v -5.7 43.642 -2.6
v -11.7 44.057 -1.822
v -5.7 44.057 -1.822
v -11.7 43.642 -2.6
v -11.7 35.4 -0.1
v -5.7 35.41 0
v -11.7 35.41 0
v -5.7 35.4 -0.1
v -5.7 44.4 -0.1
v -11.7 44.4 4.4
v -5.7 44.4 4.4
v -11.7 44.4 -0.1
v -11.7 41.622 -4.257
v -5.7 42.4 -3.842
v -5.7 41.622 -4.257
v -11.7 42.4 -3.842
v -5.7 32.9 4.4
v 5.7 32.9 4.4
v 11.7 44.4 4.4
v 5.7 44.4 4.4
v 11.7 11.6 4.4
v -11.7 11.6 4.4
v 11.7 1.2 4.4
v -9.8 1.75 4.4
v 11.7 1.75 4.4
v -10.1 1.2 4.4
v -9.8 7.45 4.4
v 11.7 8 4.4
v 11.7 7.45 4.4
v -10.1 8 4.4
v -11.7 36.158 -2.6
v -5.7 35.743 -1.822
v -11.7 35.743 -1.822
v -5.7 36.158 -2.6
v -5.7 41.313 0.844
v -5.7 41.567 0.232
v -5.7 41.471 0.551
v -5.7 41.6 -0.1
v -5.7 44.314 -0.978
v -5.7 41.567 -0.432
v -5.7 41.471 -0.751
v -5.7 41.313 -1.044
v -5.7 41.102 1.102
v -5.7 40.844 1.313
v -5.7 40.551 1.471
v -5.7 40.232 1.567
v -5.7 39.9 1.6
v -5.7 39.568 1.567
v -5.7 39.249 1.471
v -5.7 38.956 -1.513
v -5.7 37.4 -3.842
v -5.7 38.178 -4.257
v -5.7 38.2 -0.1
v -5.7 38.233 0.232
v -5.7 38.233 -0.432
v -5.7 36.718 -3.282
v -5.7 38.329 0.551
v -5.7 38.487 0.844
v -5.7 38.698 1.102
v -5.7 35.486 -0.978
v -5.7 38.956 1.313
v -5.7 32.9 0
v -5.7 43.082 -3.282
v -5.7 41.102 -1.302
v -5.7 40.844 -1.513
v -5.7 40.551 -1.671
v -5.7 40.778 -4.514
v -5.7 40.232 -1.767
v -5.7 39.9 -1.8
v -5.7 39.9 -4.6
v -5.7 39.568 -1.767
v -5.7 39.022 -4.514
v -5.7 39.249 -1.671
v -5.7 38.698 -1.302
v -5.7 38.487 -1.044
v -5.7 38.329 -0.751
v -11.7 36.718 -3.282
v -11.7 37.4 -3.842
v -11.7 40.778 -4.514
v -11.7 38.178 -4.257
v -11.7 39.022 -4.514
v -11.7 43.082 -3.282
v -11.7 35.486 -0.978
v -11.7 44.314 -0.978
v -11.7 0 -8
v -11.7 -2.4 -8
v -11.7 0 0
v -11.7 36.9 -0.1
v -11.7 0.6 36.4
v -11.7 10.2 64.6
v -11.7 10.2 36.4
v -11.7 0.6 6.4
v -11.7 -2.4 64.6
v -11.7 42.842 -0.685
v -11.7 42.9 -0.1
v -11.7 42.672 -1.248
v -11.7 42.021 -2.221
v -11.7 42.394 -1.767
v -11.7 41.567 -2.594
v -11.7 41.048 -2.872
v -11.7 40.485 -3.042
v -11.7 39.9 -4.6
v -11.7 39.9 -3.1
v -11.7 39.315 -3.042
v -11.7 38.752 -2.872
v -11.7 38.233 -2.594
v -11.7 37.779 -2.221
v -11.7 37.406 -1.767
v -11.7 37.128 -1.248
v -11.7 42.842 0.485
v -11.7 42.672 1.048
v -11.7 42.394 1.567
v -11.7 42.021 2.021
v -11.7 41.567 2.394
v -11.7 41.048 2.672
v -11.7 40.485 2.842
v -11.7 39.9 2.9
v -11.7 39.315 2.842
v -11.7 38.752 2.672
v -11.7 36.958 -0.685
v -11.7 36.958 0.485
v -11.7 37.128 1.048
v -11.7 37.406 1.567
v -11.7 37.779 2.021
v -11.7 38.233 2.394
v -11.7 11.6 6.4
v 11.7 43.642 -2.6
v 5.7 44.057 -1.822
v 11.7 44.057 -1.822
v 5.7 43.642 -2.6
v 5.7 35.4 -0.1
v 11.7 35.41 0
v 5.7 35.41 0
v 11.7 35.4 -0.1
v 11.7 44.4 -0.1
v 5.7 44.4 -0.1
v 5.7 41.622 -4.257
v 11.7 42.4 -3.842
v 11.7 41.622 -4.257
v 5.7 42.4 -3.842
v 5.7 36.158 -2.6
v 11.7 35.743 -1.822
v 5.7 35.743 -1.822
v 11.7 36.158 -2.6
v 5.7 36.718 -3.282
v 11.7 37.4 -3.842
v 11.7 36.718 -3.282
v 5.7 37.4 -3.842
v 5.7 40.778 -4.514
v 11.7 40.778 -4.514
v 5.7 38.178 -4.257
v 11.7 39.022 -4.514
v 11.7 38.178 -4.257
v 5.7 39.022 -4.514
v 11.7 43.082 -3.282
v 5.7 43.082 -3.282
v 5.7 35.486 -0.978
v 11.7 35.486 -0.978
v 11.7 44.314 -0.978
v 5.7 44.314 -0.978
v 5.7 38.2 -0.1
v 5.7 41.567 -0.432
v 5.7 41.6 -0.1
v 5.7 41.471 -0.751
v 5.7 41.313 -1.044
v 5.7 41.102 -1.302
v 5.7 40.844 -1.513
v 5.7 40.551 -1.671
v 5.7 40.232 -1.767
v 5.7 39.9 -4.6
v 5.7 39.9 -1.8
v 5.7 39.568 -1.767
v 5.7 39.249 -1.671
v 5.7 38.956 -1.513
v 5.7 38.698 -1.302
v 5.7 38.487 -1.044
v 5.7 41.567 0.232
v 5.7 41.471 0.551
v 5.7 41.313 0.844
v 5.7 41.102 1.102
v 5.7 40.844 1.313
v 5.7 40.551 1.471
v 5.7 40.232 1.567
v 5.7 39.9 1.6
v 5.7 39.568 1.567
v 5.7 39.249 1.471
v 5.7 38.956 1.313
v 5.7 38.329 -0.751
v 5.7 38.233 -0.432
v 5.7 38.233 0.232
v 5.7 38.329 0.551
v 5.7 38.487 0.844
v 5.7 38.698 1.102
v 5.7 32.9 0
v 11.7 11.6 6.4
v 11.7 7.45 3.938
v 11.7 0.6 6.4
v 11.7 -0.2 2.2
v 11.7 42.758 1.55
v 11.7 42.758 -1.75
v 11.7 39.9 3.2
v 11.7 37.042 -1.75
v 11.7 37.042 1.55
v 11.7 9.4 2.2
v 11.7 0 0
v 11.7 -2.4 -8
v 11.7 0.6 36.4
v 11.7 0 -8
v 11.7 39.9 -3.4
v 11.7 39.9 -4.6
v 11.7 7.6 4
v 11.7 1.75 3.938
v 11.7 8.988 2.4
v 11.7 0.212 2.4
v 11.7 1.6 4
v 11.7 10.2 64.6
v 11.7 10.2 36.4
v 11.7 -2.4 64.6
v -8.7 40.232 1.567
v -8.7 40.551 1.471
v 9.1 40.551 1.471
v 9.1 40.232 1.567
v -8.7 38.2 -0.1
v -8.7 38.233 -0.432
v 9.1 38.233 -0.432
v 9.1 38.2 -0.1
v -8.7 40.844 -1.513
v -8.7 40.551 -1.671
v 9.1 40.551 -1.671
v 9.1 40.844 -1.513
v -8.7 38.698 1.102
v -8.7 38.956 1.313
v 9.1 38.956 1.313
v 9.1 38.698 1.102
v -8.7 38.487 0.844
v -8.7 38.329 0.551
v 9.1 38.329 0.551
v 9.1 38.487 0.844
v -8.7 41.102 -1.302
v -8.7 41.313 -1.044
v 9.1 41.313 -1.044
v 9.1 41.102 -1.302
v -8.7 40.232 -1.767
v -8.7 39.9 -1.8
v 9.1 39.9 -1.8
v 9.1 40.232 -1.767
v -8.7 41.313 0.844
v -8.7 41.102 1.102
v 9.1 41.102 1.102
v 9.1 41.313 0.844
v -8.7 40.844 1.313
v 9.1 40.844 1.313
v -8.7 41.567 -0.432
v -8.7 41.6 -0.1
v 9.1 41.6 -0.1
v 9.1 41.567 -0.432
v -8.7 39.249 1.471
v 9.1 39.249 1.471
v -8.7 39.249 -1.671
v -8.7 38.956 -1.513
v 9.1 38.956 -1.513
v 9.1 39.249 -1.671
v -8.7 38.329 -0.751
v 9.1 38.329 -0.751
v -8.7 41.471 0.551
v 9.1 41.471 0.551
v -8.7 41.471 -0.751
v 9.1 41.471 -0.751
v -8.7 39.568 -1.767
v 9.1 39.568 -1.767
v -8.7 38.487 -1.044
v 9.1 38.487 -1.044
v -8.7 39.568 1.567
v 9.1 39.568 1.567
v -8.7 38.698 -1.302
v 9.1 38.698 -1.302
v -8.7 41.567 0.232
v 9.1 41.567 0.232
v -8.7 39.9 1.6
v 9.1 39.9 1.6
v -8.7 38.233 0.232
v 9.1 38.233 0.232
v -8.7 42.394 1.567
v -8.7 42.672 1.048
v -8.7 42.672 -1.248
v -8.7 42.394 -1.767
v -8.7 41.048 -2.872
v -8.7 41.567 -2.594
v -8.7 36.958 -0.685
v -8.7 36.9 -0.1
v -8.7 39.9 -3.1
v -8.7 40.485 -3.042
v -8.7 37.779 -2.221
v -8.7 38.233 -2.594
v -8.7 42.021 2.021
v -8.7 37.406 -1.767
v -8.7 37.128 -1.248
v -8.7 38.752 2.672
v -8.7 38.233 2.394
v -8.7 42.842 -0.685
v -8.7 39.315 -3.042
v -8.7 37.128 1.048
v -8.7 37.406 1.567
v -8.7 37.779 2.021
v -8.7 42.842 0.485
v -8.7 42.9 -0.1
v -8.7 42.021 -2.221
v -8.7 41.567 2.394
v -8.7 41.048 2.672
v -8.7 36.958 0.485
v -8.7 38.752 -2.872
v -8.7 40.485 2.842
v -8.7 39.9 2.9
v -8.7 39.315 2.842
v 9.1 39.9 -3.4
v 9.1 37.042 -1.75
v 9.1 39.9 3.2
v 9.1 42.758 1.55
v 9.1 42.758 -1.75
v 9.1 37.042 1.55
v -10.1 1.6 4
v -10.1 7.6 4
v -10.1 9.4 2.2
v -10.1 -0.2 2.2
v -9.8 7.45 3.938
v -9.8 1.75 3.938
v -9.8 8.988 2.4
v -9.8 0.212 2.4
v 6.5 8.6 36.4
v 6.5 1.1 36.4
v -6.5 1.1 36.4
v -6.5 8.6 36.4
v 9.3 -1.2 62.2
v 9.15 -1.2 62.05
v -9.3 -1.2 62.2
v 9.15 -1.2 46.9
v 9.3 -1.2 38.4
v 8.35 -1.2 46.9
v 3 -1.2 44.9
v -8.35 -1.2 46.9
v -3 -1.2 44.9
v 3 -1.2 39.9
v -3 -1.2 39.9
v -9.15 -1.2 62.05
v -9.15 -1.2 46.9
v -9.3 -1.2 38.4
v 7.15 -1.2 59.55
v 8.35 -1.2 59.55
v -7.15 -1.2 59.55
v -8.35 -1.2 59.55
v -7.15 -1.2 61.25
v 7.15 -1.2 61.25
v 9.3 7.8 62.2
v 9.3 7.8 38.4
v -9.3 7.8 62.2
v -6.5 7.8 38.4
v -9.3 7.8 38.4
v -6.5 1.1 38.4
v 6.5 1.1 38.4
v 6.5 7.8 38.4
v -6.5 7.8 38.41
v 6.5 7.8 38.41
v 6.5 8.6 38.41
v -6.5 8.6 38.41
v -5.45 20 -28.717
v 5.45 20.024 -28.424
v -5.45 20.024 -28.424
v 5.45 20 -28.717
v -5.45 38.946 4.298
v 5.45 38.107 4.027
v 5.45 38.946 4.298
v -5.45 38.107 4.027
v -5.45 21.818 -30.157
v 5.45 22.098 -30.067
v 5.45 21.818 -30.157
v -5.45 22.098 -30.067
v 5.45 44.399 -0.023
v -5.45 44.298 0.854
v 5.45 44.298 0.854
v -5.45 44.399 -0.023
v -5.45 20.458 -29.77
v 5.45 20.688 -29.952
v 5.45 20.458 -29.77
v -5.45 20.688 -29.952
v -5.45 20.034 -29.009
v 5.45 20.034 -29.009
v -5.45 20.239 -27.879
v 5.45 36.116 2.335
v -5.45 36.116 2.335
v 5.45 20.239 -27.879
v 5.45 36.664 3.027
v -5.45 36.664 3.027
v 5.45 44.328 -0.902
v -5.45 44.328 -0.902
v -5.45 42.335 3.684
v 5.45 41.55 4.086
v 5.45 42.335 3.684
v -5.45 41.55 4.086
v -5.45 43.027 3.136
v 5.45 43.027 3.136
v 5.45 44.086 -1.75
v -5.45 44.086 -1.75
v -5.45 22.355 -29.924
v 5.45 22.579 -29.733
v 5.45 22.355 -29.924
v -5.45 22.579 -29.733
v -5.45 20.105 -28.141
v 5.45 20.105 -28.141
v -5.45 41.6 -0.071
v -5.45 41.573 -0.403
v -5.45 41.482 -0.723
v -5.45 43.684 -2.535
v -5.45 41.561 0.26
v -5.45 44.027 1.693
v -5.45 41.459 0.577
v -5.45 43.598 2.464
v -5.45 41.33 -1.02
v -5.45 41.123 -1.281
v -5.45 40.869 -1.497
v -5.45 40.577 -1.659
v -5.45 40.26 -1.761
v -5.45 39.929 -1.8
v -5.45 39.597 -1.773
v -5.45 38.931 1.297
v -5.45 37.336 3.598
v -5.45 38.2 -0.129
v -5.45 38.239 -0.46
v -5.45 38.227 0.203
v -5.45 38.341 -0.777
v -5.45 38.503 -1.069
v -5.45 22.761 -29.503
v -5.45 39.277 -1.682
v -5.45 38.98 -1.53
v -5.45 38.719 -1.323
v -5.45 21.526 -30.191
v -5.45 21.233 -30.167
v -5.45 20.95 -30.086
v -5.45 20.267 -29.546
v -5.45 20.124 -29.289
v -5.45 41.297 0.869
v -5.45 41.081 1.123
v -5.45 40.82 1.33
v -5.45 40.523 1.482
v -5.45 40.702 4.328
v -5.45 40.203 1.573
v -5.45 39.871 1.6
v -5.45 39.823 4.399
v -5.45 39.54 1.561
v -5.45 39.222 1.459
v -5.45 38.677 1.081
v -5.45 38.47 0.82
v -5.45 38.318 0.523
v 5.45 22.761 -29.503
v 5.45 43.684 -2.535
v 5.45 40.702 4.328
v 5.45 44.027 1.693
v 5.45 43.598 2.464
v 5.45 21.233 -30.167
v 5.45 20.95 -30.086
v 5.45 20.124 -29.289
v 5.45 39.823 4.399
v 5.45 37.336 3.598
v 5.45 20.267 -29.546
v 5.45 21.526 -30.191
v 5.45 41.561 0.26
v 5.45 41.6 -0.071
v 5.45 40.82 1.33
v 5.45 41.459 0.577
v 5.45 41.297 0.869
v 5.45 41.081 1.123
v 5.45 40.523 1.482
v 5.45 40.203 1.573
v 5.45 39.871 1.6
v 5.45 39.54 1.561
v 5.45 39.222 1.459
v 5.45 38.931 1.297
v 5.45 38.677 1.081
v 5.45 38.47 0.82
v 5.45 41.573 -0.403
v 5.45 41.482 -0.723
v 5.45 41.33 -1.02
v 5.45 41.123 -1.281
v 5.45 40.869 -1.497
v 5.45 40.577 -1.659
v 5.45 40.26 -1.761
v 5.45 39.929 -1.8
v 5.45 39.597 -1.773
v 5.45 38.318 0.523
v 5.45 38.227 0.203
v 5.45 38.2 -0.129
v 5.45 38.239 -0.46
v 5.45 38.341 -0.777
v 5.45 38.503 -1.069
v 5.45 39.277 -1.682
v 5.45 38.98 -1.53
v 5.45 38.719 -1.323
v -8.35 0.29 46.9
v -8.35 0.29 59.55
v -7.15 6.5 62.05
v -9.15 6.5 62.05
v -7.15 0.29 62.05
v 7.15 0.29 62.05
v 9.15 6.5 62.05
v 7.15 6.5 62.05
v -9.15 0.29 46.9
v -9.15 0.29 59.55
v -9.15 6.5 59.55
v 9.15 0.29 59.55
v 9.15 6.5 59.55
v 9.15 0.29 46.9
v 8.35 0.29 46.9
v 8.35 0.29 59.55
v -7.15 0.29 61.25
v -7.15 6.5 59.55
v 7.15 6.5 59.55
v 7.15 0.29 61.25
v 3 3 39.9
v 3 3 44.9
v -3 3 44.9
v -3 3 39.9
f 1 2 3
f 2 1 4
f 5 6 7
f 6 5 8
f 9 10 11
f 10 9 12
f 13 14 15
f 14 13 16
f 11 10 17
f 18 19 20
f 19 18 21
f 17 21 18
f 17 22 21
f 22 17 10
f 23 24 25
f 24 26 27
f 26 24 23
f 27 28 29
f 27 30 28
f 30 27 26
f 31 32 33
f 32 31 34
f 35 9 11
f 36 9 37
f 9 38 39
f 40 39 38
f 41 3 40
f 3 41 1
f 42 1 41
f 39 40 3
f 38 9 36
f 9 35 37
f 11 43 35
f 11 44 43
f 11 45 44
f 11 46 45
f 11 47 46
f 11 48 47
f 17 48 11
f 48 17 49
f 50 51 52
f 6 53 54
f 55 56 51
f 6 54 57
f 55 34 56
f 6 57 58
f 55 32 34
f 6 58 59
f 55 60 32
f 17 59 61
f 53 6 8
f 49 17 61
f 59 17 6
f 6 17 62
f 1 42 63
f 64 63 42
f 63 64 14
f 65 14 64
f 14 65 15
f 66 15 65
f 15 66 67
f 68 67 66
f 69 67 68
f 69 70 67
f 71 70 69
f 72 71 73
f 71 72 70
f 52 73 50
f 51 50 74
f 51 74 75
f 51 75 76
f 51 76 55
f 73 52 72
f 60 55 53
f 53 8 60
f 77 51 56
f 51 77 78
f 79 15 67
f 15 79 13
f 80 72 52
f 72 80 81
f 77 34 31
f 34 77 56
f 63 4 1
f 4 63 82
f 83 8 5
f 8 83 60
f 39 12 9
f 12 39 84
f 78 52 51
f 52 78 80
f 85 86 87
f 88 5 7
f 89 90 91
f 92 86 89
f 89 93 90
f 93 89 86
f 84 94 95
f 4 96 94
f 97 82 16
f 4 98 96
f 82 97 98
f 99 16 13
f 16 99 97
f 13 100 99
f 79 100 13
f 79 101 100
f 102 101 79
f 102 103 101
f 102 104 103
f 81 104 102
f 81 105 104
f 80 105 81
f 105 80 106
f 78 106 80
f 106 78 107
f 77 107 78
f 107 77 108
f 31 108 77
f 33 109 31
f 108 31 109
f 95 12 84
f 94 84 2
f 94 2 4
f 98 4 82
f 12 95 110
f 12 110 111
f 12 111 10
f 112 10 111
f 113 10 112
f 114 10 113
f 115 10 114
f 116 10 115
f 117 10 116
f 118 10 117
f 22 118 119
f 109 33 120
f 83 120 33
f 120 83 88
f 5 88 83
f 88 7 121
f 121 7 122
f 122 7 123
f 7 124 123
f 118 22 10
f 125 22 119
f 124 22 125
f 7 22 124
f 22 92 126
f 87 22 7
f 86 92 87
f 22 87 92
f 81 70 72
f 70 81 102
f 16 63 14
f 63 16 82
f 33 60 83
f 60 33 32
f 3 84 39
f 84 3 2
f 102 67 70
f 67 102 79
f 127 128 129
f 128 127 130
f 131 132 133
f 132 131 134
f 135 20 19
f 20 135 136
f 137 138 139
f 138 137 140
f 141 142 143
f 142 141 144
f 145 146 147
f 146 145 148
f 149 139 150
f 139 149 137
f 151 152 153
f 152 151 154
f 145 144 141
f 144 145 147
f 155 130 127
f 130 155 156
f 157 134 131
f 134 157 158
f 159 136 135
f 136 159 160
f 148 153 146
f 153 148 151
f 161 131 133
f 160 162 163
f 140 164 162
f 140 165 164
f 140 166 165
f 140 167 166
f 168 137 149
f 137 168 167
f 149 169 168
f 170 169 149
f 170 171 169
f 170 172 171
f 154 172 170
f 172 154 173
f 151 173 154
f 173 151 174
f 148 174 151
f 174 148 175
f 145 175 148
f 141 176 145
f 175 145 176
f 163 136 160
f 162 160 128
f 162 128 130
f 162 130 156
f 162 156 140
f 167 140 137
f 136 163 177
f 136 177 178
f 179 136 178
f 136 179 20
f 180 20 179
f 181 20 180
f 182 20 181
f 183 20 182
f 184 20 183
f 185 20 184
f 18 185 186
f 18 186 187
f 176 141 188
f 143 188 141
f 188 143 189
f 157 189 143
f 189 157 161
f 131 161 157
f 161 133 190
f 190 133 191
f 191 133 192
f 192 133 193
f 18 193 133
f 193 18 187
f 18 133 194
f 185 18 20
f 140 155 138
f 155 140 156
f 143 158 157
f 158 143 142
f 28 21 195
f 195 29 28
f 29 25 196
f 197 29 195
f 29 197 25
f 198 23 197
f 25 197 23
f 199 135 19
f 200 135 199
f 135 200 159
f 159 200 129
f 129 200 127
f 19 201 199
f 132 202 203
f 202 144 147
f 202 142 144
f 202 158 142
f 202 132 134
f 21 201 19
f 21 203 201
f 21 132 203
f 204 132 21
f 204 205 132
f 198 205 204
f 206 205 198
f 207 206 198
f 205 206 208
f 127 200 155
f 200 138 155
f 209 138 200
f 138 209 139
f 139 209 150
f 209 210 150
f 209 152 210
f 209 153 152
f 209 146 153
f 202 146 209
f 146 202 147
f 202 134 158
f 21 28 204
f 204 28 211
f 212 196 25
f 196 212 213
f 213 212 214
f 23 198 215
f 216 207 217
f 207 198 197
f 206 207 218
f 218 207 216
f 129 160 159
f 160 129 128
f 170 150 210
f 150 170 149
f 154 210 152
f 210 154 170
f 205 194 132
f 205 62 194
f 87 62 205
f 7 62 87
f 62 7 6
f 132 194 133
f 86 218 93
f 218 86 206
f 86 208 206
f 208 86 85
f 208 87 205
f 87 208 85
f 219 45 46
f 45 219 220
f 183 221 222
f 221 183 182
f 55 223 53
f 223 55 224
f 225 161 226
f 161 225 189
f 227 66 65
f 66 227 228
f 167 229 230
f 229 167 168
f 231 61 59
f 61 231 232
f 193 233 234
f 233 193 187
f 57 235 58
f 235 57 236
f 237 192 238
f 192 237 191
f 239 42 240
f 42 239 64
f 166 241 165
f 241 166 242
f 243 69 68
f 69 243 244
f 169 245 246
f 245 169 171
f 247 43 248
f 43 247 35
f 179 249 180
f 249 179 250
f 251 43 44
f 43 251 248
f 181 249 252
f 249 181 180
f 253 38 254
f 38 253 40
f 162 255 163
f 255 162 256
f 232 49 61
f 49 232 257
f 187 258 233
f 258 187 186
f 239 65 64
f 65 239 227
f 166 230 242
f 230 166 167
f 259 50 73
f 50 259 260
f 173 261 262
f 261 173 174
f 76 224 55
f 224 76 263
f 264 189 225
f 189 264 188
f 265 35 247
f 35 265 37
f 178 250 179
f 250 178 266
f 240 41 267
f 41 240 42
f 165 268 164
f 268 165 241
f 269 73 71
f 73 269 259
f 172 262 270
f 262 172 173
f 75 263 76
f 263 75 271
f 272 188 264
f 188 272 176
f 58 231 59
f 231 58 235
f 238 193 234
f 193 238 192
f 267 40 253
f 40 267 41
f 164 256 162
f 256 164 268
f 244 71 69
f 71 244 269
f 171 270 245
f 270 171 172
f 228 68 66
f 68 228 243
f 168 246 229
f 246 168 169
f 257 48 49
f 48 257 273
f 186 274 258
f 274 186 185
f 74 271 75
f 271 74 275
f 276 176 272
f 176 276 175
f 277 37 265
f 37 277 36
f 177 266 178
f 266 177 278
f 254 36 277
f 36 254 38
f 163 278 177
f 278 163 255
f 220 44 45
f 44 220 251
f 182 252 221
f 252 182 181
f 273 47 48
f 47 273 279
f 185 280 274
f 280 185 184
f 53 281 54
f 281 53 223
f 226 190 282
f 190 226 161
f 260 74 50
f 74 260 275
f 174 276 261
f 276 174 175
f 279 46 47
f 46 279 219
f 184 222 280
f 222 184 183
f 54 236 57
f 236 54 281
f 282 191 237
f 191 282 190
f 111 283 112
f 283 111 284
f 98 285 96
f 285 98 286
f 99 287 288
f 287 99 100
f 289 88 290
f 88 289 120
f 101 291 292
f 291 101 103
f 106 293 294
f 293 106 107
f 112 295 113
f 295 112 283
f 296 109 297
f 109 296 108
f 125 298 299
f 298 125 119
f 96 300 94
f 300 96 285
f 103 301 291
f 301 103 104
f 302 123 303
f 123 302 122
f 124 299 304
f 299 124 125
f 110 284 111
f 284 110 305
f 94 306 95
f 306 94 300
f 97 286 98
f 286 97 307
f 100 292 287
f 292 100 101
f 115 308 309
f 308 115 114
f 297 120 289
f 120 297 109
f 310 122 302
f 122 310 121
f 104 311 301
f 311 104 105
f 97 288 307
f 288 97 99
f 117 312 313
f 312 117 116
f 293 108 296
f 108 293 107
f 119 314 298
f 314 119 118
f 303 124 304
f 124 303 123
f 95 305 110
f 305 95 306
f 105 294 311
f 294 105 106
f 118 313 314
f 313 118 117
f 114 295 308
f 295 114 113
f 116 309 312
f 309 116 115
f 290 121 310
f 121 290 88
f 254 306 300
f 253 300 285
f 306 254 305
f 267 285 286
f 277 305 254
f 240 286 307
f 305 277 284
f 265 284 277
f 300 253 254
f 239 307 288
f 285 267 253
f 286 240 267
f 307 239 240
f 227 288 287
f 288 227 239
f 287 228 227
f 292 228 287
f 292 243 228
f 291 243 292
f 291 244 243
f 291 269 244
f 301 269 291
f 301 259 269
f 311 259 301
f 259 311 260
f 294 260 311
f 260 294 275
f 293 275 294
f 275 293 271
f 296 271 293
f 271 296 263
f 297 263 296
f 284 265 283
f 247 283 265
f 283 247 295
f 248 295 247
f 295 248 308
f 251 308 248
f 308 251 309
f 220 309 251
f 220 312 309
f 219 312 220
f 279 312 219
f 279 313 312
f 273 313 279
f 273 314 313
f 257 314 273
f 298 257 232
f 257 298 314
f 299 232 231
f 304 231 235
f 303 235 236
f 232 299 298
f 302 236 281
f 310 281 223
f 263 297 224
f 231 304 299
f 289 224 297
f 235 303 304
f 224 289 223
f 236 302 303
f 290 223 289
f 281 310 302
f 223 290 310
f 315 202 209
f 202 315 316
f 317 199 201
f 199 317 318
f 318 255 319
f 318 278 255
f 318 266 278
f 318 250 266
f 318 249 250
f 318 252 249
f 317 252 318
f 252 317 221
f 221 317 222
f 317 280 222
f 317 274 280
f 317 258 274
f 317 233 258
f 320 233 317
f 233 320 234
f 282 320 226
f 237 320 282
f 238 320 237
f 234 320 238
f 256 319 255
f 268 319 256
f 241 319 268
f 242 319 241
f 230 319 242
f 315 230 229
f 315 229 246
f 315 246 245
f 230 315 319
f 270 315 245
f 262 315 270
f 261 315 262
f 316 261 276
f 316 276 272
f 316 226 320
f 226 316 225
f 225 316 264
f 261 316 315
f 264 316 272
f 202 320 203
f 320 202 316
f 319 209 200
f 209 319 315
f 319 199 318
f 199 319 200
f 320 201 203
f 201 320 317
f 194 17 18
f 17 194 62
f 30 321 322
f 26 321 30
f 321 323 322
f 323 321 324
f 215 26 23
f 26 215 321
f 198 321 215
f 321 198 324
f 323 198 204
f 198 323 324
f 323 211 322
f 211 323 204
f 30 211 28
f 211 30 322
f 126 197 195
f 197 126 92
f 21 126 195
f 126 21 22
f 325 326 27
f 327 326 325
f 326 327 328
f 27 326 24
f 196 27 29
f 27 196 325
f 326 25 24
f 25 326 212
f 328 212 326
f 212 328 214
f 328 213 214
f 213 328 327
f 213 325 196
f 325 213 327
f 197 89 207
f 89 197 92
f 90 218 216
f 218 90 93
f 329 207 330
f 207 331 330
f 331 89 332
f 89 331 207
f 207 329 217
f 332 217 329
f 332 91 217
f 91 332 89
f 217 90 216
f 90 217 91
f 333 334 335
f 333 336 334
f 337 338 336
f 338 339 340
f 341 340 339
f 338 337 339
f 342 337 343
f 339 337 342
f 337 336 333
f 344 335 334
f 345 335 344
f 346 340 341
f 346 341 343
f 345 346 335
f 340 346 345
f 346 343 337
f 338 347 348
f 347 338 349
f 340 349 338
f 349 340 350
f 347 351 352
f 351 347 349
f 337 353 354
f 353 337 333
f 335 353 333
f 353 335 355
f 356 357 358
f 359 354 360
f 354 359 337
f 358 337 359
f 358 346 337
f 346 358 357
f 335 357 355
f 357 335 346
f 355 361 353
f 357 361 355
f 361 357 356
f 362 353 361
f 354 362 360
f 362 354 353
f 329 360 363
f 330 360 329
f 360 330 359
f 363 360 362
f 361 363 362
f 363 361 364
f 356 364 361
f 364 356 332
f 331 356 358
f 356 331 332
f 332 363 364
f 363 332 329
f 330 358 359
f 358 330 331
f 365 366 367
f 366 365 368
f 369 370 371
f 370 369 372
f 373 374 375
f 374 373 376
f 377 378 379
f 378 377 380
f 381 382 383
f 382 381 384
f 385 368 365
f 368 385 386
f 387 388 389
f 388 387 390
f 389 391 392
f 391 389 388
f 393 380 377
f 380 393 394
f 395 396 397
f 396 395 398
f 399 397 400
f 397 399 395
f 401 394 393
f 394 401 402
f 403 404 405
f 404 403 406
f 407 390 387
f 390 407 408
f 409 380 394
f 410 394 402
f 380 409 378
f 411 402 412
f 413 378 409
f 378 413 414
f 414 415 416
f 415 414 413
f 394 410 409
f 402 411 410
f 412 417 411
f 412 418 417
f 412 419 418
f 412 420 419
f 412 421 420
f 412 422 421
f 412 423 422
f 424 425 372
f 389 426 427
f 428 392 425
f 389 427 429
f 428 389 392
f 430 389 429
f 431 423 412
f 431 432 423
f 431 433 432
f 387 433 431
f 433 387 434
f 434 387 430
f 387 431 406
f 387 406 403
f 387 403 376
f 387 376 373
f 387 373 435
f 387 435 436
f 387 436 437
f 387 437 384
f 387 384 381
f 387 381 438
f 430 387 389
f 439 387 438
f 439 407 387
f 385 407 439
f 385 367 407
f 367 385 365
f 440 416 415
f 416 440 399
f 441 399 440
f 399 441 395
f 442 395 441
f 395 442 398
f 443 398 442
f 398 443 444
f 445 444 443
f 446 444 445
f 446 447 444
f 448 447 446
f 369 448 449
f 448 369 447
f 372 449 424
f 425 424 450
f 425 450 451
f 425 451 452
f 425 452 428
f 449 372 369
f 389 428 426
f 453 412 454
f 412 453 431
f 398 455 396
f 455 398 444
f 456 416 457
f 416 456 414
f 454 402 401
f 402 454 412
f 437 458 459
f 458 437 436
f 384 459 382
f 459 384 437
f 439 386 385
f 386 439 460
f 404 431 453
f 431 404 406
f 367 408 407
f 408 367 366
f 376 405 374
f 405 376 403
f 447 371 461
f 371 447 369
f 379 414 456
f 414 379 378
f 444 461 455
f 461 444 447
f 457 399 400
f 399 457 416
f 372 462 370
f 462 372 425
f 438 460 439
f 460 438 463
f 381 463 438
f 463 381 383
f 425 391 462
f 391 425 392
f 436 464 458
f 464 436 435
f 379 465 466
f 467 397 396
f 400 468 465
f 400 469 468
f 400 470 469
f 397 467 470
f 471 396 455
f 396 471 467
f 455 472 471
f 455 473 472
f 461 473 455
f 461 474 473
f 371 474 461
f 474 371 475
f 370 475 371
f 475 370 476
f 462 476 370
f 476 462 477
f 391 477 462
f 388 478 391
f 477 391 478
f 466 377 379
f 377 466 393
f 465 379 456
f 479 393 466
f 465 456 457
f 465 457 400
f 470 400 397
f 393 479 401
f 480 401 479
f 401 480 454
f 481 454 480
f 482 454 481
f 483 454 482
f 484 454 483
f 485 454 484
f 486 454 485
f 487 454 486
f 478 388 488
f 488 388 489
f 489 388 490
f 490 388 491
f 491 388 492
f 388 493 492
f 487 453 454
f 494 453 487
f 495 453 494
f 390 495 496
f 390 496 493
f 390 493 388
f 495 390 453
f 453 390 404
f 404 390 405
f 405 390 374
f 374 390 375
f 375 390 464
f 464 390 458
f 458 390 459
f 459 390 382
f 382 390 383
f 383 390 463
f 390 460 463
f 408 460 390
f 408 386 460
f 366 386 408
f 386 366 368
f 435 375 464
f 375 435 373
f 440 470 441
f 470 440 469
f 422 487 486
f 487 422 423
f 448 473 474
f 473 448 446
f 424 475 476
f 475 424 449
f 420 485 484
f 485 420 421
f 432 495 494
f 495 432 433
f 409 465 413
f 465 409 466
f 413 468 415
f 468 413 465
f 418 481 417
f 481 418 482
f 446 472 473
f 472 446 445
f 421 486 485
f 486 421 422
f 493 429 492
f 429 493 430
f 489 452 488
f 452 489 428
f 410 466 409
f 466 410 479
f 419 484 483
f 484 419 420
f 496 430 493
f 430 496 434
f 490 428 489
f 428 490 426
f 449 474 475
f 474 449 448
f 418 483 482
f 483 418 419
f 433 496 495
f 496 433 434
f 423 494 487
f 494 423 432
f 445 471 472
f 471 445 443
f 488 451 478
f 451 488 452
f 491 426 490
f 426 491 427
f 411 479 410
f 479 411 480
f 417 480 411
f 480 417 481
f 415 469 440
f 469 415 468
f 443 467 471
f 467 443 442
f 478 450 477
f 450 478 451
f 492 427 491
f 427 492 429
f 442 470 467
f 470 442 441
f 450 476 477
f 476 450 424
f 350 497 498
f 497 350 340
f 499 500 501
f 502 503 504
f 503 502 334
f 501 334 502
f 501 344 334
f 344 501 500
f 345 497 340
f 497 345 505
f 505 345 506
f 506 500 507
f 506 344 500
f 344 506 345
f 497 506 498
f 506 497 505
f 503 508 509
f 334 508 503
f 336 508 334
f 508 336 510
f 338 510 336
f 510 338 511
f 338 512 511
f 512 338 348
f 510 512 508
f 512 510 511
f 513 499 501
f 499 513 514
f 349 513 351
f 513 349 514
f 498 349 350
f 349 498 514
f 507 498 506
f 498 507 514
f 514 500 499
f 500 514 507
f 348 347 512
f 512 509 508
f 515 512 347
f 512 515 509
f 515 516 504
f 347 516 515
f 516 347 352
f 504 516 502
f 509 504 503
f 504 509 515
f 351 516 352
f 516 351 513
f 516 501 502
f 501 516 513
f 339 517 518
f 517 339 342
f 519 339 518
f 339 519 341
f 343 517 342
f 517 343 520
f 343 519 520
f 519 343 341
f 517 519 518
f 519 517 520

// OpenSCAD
// SPDX-FileCopyrightText: 2026 Curtis Galloway
// SPDX-License-Identifier: Apache-2.0
//
// Monitor-top case for the bare Waveshare RP2040-Zero alert light.
//
// The clip hooks over the top edge of a monitor. At the clip's front edge a
// wall rises to a pod that holds the board upright, LED side facing the
// viewer and flush with the monitor's front, USB-C end down. Under the pod is
// an open gap: the plug drops through the pod floor into it, and the cable
// bends back, runs over the monitor's top and down the back. The rear leg is
// hinged on an M3 screw so one clip fits monitors from monitor_min to
// monitor_max thick; tightening the nut sets how stiffly it swings.
//
// Four parts:
//   clip  - top plate, front lip, hinge knuckles, opaque. Print face down.
//   tower - front wall + pod, slides into the clip's dovetail. Print on its side.
//   leg   - hinged rear leg, opaque filament. Print on its side.
//   cover - front window, translucent filament. Print face down.
//
// Render one part:  openscad -D 'part="clip"' -o clip.stl monitor_case.scad
//
// Axes: x = across the monitor, y = front to back (viewer at -y),
// z = up. The monitor's top surface is z = 0, its front face y = 0.

part = "assembly";  // "clip", "tower", "leg", "cover", "fit_test", or "assembly"

/* [Monitor] */
monitor_min = 15;   // thinnest monitor the hinged leg reaches
monitor_max = 35;   // thickest monitor the clip fits over
monitor_t = 20;     // preview only: the ghost monitor's thickness
monitor_fit = 0.4;  // extra room so the clip slides on
front_lip = 8;      // how far the clip drops over the front bezel

/* [Hinged rear leg, M3 x 20 screw + M3 nut] */
leg_len = 34;       // hinge axis to tip center
knuckle_d = 9;      // hinge barrel diameter
tip_d = 3;          // rounded tip that touches the monitor's back
outer_k = 6;        // width of each of the clip's two outer knuckles
k_gap = 0.25;       // side gap between knuckles
screw_d = 3.4;      // M3 clearance hole
head_d = 6.0;       // M3 socket head counterbore
head_depth = 3.0;
nut_d = 6.6;        // M3 nut pocket, across corners
nut_depth = 2.6;

/* [Board: Waveshare RP2040-Zero] */
pcb_w = 18;         // across (x)
pcb_h = 23.5;       // along the USB axis (z, USB end down)
pcb_t = 1.0;        // PCB thickness
pcb_clr = 0.3;      // pocket clearance around the PCB
usb_h = 3.3;        // USB-C receptacle height above the PCB's top face
usb_len = 7.5;      // receptacle length up the board from its bottom edge

/* [USB-C plug and cable] */
plug_w = 13;        // molded plug body width; measure your cable
plug_d = 7.5;       // molded plug body thickness
plug_len = 22;      // plug body length below the receptacle, strain relief
                    // included. A right-angle plug needs much less.
cable_bend = 10;    // room under the plug for the cable to turn back

/* [Shell] */
wall = 2.4;
plate_t = 4.4;      // clip top plate; thick enough for the dovetail groove
floor_t = 2.0;      // pod floor
riser_t = 3.0;      // front wall holding the pod up
foot_len = 14;      // tower's foot, which carries the dovetail rail
foot_t = 2.0;

/* [Tower-to-clip joint: sliding dovetail] */
// The clip has a dovetail groove across its top plate, closed at the -x end.
// A tower's foot carries the matching rail and slides in from +x; friction
// holds it. Any tower built on dovetail_rail() fits the same clip.
dt_y = 7;           // groove center, behind the clip's front face
dt_top = 6;         // groove width at the plate's top face
dt_depth = 2.2;     // groove depth; the 45-degree walls widen it by this much
dt_stop = 1.6;      // closed end of the groove, at the -x side
dt_chamfer = 0.4;   // flare at the groove mouth for first-layer squish
joint_fit = 0.15;   // rail clearance per side; tune it with part="fit_test"
fit_tests = [0.10, 0.15, 0.20];  // rail clearances printed by part="fit_test"
cover_t = 1.2;      // translucent window thickness (thinner = brighter)
rim_t = 0.8;        // cover's friction rim
rim_d = 1.5;        // how far the rim enters the pod
rim_fit = 0.15;     // rim clearance; lower for a tighter press fit
clip_w = pcb_w + 2 * (pcb_clr + wall);  // clip width = pod width

$fn = 32;
eps = 0.01;

// ---- Derived layout ---------------------------------------------------

front = -wall;                               // outer face of the front lip

// Hinge axis: behind the thickest monitor by one barrel radius, so the leg's
// front edge clears it when the leg hangs nearly straight down.
hinge_r = knuckle_d / 2;
hinge_y = monitor_max + monitor_fit + hinge_r;
hinge_z = plate_t - hinge_r;                 // barrel top flush with the plate
foot_z = plate_t;                            // tower bottom, on the plate
dt_yc = front + dt_y;                        // groove center, y
center_k = clip_w - 2 * (outer_k + k_gap);   // the leg's knuckle width

// Leg angle (forward from straight down) where the tip meets a monitor of
// thickness t. Thin monitors need the steepest angle.
function leg_angle(t) = asin((hinge_y - tip_d / 2 - t) / leg_len);
assert(leg_angle(monitor_min) <= 50, "leg_len too short for monitor_min");

// Window face flush with the front lip.
pod_front = front + cover_t;
// The plug body hangs into the gap, so it must clear the riser behind the
// window by 0.5 mm.
plug_y = front + riser_t + 0.5 + plug_d / 2; // plug center, y
pcb_front = plug_y + usb_h / 2;              // PCB front (LED) face, y
pcb_back = pcb_front + pcb_t;
cover_gap = pcb_front - pod_front;           // window inner face to PCB face
pod_back = pcb_back + pcb_clr + wall;

gap_z0 = foot_z + foot_t;                    // top of the tower's foot
pod_z0 = gap_z0 + plug_len + cable_bend - floor_t;   // pod floor bottom
in_z0 = pod_z0 + floor_t;                    // PCB rests here
in_z1 = in_z0 + pcb_h + pcb_clr;             // pod interior top
pod_top = in_z1 + wall;
in_w = pcb_w + 2 * pcb_clr;                  // pod interior width

assert(pod_back <= monitor_min, "monitor_min too small for the pod depth");
echo(str("leg angle: ", leg_angle(monitor_min), " deg at ", monitor_min,
         " mm, ", leg_angle(monitor_max), " deg at ", monitor_max, " mm"));
echo(str("cover_gap (window to PCB face) = ", cover_gap, " mm"));
echo(str("cable gap under the pod = ", pod_z0 - gap_z0, " mm"));
echo(str("case top is ", pod_top, " mm above the monitor top"));

// ---- Base -------------------------------------------------------------

// A shape extruded along x, centered, from a 2D profile drawn in (y, z).
module along_x(w) {
  rotate([90, 0, 90]) linear_extrude(w, center = true) children();
}

module clip() {
  difference() {
    union() {
      // top plate and front lip
      translate([-clip_w / 2, front, 0]) cube([clip_w, hinge_y - front, plate_t]);
      translate([-clip_w / 2, front, -front_lip]) cube([clip_w, wall, front_lip + plate_t]);
      // two outer hinge knuckles, squared off at the rear top so they sit
      // flat on the bed when the clip prints face down
      for (s = [-1, 1])
        translate([s * (clip_w - outer_k) / 2, 0, 0])
          along_x(outer_k) hull() {
            translate([hinge_y, hinge_z]) circle(d = knuckle_d);
            translate([hinge_y, hinge_z]) square([hinge_r, hinge_r]);
          }
    }
    // room for the leg's knuckle to turn
    along_x(center_k + 2 * k_gap) translate([hinge_y, hinge_z])
      circle(r = hinge_r + 0.5);
    translate([-center_k / 2 - k_gap, hinge_y - hinge_r - 2.5, hinge_z - hinge_r - 1])
      cube([center_k + 2 * k_gap, knuckle_d + 3, knuckle_d + 2]);
    // dovetail groove for the tower's rail, closed at the -x end
    translate([dt_stop / 2 + 0.5, 0, 0])
      along_x(clip_w - dt_stop + 1) dovetail_groove_profile();
    // M3 screw hole, head counterbore on -x, nut pocket on +x
    translate([0, hinge_y, hinge_z]) {
      rotate([0, 90, 0]) cylinder(d = screw_d, h = clip_w + 2, center = true);
      translate([-clip_w / 2 - eps, 0, 0]) rotate([0, 90, 0])
        cylinder(d = head_d, h = head_depth + eps);
      translate([clip_w / 2 - nut_depth, 0, 0]) rotate([0, 90, 0])
        cylinder(d = nut_d, h = nut_depth + eps, $fn = 6);
    }
  }
}

// ---- Dovetail joint --------------------------------------------------

// Groove core cross-section in (y, z): straight-sided down to the neck
// dt_chamfer below the top face, then widening at 45 degrees to the floor.
module dovetail_core_profile() {
  a = dt_top / 2;
  w = a + dt_depth - dt_chamfer;             // half-width at the floor
  polygon([
    [dt_yc - a, plate_t + 1], [dt_yc + a, plate_t + 1],
    [dt_yc + a, plate_t - dt_chamfer],
    [dt_yc + w, plate_t - dt_depth], [dt_yc - w, plate_t - dt_depth],
    [dt_yc - a, plate_t - dt_chamfer],
  ]);
}

// Groove cut into the clip: the core plus a 45-degree flare at the mouth.
// With the clip printed face down the mouth is on the bed, so the flare
// absorbs first-layer squish; above the neck the walls widen at 45 degrees,
// which prints without support, and the floor bridges about 10 mm.
module dovetail_groove_profile() {
  a = dt_top / 2;
  c = dt_chamfer;
  dovetail_core_profile();
  polygon([
    [dt_yc - a - c, plate_t + 1], [dt_yc + a + c, plate_t + 1],
    [dt_yc + a + c, plate_t], [dt_yc + a, plate_t - c],
    [dt_yc - a, plate_t - c], [dt_yc - a - c, plate_t],
  ]);
}

// Rail cross-section: the groove core shrunk by the fit on every face,
// trimmed 0.2 mm short of the floor so it bears on the slanted walls.
module dovetail_rail_profile(fit) {
  intersection() {
    offset(delta = -fit) dovetail_core_profile();
    translate([dt_yc - 20, plate_t - dt_depth + 0.2])
      square([40, dt_depth - 0.2 + eps]);
  }
}

// The rail under a tower's foot, stopping short of the groove's closed end.
module dovetail_rail(fit = joint_fit) {
  l = clip_w - dt_stop - 0.3;
  translate([clip_w / 2 - l / 2, 0, 0]) along_x(l) dovetail_rail_profile(fit);
}

// Fit test: a 10 mm slice of the clip's groove (open at both ends) and one
// short rail per clearance in fit_tests, marked with 1, 2, 3... notches.
// Pick the rail that slides in with firm hand pressure and set joint_fit.
module fit_test() {
  // groove slice, face down like the clip
  translate([0, 0, plate_t]) rotate([180, 0, 0]) difference() {
    translate([-5, front, 0]) cube([10, foot_len, plate_t]);
    along_x(12) dovetail_groove_profile();
  }
  // rails standing on end, like the tower on its side, 10 mm apart
  for (i = [0 : len(fit_tests) - 1])
    translate([16 + i * 10, 0, 0]) rotate([0, -90, 0]) difference() {
      union() {
        translate([0, dt_yc - dt_top / 2 - 2, foot_z]) cube([10, dt_top + 4, foot_t]);
        translate([5, 0, 0]) along_x(10) dovetail_rail_profile(fit_tests[i]);
      }
      // i + 1 notches at the top, to tell the rails apart
      for (n = [0 : i])
        translate([10 - 1.2 - n * 2, dt_yc + dt_top / 2 + 1, foot_z - 1])
          cube([0.8, 2, foot_t + 2]);
    }
}

// ---- Leg --------------------------------------------------------------

// Leg profile in (y, z), hanging straight down from the hinge axis at the
// origin: a barrel tapering to the rounded tip.
module leg_profile() {
  hull() {
    circle(d = knuckle_d);
    translate([0, -leg_len]) circle(d = tip_d);
  }
}

// The leg, hinge axis on the x axis. One width throughout, the width of the
// knuckle that fits between the clip's outer knuckles, so it prints on its
// side with no overhangs.
module leg() {
  difference() {
    along_x(center_k) leg_profile();
    rotate([0, 90, 0]) cylinder(d = screw_d, h = clip_w + 2, center = true);
  }
}

// The leg in place on the clip, swung forward to touch a monitor of
// thickness t.
module leg_placed(t) {
  translate([0, hinge_y, hinge_z]) rotate([-leg_angle(t), 0, 0]) leg();
}

// ---- Tower ------------------------------------------------------------

module riser() {
  // foot with the dovetail rail, then the front wall up to the pod floor;
  // the gap behind the wall is open at both sides and the back
  translate([-clip_w / 2, front, foot_z]) cube([clip_w, foot_len, foot_t]);
  dovetail_rail();
  translate([-clip_w / 2, front, foot_z]) cube([clip_w, riser_t, pod_z0 - foot_z + eps]);
}

module pod() {
  difference() {
    translate([-clip_w / 2, pod_front, pod_z0])
      cube([clip_w, pod_back - pod_front, pod_top - pod_z0]);
    // board pocket, open at the front
    translate([-in_w / 2, pod_front - eps, in_z0])
      cube([in_w, pcb_back + pcb_clr - pod_front + eps, in_z1 - in_z0]);
    // USB-C plug drops through the floor into the gap
    translate([-plug_w / 2, plug_y - plug_d / 2, pod_z0 - eps])
      cube([plug_w, plug_d, floor_t + 2 * eps]);
  }
}

module tower() {
  riser();
  pod();
}

// ---- Cover ------------------------------------------------------------

module cover() {
  rw = in_w - 2 * rim_fit;                   // rim outer width
  rz0 = in_z0 + usb_len + 1;                 // rim sides stop above the USB-C
  rz1 = in_z1 - rim_fit;
  // window, flush with the riser and front lip
  translate([-clip_w / 2, front, pod_z0]) cube([clip_w, cover_t, pod_top - pod_z0]);
  // friction rim: top edge and the upper part of both sides. No bottom edge,
  // where the USB-C receptacle sits.
  translate([-rw / 2, pod_front - eps, rz1 - rim_t]) cube([rw, rim_d, rim_t]);
  for (s = [-1, 1])
    translate([s > 0 ? rw / 2 - rim_t : -rw / 2, pod_front - eps, rz0])
      cube([rim_t, rim_d, rz1 - rz0]);
  // posts that press the PCB's top corners against the pod's back wall
  for (s = [-1, 1])
    translate([s * (rw / 2 - 1) - 1, pod_front - eps, rz1 - 2.5])
      cube([2, cover_gap + eps, 2.5]);
  // pad that presses on the USB-C receptacle, holding the bottom end
  translate([-3, pod_front - eps, in_z0 + 1.5])
    cube([6, cover_gap - usb_h - 0.2 + eps, usb_len - 2.5]);
}

// ---- Output -----------------------------------------------------------

module monitor_ghost() {
  %translate([-60, 0, -60]) cube([120, monitor_t, 60]);
}

module pcb_ghost() {
  %translate([-pcb_w / 2, pcb_front, in_z0]) cube([pcb_w, pcb_t, pcb_h]);
  %translate([-4.5, pcb_front - usb_h, in_z0]) cube([9, usb_h, usb_len]);
  // plug body
  %translate([-plug_w / 2, plug_y - plug_d / 2, in_z0 - plug_len])
    cube([plug_w, plug_d, plug_len]);
}

if (part == "clip") {
  // face down: top plate on the bed, lip and hinge knuckles pointing up
  translate([0, 0, plate_t]) rotate([180, 0, 0]) clip();
} else if (part == "tower") {
  // on its side, no supports
  translate([0, 0, clip_w / 2]) rotate([0, 90, 0]) tower();
} else if (part == "leg") {
  // on its side, no supports
  translate([0, 0, center_k / 2]) rotate([0, 90, 0]) leg();
} else if (part == "fit_test") {
  fit_test();
} else if (part == "cover") {
  // window face down
  rotate([90, 0, 0]) translate([0, -front, 0]) cover();
} else if (part == "assembly") {
  monitor_ghost();
  pcb_ghost();
  color("dimgray") clip();
  color("gray") tower();
  color("slategray") leg_placed(monitor_t);
  color("white", 0.6) cover();
}
